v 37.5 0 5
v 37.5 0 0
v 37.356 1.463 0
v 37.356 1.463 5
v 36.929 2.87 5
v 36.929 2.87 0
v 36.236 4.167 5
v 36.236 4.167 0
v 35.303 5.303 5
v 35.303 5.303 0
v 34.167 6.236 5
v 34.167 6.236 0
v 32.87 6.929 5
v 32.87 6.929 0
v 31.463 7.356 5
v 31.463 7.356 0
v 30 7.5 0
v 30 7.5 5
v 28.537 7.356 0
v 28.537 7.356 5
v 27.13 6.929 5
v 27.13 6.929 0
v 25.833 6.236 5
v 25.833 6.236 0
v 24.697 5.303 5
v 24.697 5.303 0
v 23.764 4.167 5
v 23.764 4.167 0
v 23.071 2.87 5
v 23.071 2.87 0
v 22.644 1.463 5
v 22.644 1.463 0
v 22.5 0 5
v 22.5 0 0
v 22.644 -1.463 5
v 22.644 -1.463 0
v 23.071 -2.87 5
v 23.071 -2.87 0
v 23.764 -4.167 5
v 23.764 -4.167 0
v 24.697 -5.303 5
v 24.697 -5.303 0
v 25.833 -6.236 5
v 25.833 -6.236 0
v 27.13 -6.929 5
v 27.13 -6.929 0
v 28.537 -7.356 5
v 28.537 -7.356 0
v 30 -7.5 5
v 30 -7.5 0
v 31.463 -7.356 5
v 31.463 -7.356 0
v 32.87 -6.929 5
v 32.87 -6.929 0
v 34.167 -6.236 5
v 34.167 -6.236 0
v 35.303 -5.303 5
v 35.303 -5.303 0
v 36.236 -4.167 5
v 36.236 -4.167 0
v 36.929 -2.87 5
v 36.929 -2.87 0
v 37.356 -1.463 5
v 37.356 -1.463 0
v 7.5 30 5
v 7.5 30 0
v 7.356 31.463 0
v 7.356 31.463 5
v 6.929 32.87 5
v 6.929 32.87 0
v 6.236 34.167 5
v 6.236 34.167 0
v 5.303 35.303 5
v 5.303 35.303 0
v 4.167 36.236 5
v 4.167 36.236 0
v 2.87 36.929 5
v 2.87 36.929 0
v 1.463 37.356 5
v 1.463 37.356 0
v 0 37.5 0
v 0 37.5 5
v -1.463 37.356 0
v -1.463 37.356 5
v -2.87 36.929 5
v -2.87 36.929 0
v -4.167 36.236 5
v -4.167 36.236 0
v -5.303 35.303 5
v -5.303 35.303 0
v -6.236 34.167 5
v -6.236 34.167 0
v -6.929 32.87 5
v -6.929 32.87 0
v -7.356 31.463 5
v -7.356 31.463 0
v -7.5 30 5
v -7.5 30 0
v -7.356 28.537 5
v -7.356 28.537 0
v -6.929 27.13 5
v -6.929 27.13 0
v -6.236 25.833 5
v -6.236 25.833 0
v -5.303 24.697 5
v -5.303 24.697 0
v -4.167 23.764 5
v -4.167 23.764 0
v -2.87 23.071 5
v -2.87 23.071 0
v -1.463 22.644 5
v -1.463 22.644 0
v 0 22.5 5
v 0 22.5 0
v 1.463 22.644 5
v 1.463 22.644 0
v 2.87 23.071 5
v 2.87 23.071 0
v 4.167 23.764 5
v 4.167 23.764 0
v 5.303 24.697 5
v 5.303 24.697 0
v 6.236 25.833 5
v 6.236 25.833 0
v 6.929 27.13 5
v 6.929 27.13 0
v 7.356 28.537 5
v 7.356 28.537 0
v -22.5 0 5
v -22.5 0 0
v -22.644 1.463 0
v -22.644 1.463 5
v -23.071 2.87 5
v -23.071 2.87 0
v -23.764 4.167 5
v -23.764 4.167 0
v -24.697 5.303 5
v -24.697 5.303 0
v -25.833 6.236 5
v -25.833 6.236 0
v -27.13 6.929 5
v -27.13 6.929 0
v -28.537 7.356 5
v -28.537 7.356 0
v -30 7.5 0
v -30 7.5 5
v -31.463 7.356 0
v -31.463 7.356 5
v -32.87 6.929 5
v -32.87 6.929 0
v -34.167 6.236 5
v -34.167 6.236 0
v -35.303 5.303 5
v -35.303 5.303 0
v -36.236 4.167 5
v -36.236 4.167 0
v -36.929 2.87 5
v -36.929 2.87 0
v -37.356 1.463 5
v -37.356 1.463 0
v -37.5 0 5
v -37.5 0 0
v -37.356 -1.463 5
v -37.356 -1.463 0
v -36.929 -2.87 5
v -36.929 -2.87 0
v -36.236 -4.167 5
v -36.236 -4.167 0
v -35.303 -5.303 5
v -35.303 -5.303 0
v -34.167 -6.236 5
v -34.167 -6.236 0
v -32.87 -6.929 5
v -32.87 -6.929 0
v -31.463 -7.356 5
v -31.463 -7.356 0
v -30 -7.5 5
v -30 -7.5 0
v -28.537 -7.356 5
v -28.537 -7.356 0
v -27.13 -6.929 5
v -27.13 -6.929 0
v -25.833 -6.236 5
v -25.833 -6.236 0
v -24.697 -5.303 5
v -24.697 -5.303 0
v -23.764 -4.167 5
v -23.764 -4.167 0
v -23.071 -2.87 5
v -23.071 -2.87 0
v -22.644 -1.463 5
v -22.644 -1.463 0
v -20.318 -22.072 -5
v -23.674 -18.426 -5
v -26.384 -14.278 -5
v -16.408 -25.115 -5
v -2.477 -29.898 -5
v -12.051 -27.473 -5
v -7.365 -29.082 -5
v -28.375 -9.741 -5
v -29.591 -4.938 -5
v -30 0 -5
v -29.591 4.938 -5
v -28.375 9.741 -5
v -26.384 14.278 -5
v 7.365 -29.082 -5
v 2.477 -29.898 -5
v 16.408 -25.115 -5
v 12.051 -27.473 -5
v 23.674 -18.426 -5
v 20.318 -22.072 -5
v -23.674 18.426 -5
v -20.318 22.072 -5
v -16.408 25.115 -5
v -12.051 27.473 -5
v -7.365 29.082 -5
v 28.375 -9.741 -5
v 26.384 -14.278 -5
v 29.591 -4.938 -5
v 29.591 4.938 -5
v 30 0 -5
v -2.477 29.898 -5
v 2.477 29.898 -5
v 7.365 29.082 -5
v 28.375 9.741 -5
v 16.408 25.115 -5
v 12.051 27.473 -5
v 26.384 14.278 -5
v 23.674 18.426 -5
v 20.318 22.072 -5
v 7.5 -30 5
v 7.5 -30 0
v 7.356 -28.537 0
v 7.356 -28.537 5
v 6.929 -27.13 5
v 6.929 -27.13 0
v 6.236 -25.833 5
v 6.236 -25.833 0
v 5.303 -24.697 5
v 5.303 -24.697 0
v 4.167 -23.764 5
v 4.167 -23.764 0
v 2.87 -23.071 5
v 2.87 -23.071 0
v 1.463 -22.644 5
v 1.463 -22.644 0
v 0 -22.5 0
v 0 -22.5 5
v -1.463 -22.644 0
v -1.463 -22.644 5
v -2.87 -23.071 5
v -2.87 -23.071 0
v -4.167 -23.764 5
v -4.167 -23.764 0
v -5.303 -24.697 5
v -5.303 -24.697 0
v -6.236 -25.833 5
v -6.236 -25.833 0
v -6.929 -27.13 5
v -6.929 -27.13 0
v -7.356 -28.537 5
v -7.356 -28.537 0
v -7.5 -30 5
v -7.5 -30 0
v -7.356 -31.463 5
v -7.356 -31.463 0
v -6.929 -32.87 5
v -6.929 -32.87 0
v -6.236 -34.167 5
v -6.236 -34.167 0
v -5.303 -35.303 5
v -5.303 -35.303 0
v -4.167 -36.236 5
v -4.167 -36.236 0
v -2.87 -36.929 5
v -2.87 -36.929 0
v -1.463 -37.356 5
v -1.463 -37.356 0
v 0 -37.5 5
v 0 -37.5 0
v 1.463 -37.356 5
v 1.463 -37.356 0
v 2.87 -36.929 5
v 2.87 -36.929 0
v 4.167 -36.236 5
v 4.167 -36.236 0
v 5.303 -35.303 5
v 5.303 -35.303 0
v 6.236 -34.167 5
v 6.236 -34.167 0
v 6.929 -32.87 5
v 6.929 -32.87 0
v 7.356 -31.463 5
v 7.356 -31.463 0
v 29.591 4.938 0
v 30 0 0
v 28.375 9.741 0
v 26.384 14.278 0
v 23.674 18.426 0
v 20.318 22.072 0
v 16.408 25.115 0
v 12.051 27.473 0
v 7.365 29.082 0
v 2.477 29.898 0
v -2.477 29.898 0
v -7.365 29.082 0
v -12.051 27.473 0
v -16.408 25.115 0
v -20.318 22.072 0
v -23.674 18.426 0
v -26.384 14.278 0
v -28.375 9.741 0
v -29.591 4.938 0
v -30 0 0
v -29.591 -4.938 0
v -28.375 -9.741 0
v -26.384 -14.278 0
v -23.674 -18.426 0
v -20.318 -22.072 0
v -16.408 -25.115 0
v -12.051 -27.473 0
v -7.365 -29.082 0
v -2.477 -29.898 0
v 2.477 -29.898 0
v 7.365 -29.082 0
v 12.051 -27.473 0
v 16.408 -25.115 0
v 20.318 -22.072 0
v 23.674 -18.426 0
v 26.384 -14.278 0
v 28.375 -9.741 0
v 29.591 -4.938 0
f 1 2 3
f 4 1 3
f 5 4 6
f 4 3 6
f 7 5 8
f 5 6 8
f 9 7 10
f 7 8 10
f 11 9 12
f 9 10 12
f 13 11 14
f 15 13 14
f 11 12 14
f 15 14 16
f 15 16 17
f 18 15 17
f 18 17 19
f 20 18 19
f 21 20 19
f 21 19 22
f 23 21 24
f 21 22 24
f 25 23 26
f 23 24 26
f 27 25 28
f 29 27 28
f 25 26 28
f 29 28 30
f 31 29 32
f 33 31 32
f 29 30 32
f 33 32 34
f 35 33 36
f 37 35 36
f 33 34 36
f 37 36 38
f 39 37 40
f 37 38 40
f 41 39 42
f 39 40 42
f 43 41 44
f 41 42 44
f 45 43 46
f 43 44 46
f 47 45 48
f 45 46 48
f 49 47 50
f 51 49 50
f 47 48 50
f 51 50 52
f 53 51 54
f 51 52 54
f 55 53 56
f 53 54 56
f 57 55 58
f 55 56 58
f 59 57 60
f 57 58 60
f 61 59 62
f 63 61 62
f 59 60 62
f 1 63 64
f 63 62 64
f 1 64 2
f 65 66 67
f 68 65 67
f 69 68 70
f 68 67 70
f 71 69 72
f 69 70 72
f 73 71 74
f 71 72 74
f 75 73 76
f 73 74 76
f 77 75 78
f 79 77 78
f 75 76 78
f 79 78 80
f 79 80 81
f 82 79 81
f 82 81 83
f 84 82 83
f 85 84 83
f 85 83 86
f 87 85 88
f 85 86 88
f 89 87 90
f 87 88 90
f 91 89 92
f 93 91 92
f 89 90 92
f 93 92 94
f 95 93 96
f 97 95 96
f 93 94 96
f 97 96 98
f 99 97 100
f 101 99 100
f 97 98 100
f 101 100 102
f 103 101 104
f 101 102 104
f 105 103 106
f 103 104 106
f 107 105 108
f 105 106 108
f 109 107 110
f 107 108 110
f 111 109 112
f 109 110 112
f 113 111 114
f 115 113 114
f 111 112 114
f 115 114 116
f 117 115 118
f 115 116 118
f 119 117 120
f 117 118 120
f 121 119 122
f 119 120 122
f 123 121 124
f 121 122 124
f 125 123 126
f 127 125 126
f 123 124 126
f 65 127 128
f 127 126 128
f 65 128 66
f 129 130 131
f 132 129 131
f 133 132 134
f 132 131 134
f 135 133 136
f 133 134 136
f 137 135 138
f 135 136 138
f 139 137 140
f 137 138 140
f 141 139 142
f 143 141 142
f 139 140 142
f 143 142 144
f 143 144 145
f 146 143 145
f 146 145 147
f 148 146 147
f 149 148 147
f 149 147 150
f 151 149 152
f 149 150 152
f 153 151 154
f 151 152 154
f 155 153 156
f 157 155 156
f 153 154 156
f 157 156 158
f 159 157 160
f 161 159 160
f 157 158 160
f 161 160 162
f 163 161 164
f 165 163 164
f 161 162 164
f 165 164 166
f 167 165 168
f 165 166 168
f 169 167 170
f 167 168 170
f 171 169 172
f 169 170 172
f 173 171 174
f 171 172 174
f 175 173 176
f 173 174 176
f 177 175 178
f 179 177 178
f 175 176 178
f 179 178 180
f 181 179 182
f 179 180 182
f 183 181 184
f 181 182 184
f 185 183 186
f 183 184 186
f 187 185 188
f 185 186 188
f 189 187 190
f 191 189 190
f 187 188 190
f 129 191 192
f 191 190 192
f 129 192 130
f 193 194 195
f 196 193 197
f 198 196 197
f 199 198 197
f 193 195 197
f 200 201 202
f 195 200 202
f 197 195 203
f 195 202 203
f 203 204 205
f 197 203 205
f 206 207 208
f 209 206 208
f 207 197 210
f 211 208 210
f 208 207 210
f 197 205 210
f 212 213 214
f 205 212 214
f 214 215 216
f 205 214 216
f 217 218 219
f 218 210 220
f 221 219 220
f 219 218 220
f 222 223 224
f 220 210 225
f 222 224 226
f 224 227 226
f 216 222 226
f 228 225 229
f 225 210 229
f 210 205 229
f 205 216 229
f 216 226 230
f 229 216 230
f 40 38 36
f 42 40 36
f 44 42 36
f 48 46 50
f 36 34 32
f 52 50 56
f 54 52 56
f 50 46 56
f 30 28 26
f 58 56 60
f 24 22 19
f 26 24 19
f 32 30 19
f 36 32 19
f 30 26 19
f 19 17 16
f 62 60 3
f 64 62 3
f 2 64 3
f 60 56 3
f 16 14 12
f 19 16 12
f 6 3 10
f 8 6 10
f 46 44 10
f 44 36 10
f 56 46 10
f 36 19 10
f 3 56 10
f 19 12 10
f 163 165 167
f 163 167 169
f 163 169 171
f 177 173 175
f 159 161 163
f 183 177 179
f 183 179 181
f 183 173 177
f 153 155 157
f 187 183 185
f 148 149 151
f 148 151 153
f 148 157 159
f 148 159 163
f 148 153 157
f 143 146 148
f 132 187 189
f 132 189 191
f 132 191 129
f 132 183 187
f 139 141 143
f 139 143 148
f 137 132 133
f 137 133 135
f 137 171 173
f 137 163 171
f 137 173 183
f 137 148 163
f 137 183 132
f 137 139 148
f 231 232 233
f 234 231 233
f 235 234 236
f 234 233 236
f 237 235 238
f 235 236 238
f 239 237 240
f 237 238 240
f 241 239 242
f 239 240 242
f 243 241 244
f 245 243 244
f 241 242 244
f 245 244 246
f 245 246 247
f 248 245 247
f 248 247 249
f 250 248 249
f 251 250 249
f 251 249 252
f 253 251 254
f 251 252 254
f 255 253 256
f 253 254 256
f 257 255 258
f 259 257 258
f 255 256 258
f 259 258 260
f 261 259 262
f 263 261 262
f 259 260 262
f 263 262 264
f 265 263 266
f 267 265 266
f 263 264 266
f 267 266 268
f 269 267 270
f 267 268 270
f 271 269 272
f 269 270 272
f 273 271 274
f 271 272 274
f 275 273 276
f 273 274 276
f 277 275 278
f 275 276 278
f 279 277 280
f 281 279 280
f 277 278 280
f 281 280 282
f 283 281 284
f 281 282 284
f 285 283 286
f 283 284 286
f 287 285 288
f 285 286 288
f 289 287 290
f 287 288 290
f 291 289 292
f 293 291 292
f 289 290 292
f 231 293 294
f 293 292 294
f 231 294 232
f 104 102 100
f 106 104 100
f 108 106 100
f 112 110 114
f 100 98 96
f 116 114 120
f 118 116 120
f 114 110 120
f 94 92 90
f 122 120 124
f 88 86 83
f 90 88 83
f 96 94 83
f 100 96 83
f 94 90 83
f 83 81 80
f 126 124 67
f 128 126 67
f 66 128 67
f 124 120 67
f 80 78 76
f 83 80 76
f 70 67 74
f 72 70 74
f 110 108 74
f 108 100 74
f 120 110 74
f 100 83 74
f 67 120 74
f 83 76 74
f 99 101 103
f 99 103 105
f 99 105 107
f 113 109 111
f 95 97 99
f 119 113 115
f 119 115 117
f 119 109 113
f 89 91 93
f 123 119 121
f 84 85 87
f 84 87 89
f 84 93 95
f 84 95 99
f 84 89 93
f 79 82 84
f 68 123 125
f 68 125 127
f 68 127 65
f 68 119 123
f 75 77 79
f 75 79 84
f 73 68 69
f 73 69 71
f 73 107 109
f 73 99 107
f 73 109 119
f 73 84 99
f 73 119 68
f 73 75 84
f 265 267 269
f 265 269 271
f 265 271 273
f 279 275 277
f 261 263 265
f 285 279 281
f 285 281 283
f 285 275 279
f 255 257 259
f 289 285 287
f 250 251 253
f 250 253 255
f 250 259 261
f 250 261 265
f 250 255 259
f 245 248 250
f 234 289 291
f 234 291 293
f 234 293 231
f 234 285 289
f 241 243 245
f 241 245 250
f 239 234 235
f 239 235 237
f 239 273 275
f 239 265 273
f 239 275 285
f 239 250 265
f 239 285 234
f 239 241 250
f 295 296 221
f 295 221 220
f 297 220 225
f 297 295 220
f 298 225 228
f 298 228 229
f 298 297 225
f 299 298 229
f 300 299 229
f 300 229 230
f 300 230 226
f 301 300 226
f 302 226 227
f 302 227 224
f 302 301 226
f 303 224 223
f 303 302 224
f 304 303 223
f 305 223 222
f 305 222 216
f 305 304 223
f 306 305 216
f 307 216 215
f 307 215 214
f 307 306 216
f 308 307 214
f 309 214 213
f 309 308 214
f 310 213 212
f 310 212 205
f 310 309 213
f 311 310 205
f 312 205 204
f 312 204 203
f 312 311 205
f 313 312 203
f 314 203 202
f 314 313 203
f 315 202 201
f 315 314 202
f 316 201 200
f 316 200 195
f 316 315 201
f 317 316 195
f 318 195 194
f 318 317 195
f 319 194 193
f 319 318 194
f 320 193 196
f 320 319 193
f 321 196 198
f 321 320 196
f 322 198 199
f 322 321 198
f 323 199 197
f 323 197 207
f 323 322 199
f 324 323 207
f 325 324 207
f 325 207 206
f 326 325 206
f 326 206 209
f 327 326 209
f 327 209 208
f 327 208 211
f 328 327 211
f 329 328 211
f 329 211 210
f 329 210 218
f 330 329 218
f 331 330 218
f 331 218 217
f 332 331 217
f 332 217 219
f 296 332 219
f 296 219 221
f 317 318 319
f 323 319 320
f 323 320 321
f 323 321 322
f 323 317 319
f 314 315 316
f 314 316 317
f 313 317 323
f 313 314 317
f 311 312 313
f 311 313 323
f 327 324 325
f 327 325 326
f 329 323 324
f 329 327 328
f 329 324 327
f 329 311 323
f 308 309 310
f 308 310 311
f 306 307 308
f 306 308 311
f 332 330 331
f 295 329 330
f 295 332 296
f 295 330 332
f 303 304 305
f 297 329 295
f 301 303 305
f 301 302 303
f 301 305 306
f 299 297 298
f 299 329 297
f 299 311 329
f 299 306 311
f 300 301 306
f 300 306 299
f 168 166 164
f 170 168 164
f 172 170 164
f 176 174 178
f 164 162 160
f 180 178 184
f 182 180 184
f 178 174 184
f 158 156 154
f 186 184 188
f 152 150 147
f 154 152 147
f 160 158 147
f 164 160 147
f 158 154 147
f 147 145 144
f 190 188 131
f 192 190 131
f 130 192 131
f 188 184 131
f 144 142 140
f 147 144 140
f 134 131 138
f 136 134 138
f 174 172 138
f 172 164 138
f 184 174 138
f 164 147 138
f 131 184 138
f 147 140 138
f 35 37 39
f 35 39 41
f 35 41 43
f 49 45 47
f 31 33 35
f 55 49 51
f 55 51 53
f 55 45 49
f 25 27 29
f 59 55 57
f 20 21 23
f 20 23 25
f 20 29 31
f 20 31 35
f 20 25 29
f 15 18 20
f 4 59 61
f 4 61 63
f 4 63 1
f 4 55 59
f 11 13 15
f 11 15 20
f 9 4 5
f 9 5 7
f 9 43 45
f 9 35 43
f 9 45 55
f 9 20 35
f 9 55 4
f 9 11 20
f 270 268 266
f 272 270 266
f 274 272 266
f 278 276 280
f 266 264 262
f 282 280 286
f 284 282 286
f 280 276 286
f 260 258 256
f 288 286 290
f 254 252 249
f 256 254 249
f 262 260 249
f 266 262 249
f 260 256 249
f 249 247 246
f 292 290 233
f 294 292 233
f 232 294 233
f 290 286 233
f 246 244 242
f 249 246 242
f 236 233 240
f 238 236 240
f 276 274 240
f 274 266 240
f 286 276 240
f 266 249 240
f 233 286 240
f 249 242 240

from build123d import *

# Parameters (mm, degrees)
SKIZZE1_R                 = 30
LINEAR_AUSTRAGEN1_DEPTH   = 5
SKIZZE1_3_R               = 7.5
LINEAR_AUSTRAGEN2_DEPTH   = 5
LINEAR_AUSTRAGEN2_2_DEPTH = 5
LINEAR_AUSTRAGEN2_3_DEPTH = 5
LINEAR_AUSTRAGEN2_4_DEPTH = 5


with BuildPart() as part:
    # Skizze1 → Linear austragen1 (new body)
    with BuildSketch(Plane.XY):
        Circle(SKIZZE1_R)
    extrude(amount=-LINEAR_AUSTRAGEN1_DEPTH)


with BuildPart() as body_2:
    # Skizze1_3 → Linear austragen2 (new body)
    with BuildSketch(Plane.XY):
        with Locations((0, 30)):
            Circle(SKIZZE1_3_R)
    extrude(amount=LINEAR_AUSTRAGEN2_DEPTH)


with BuildPart() as body_3:
    # Skizze1_3 → Linear austragen2 2 (new body)
    with BuildSketch(Plane.XY):
        with Locations((30, 0)):
            Circle(SKIZZE1_3_R)
    extrude(amount=LINEAR_AUSTRAGEN2_2_DEPTH)


with BuildPart() as body_4:
    # Skizze1_3 → Linear austragen2 3 (new body)
    with BuildSketch(Plane.XY):
        with Locations((0, -30)):
            Circle(SKIZZE1_3_R)
    extrude(amount=LINEAR_AUSTRAGEN2_3_DEPTH)


with BuildPart() as body_5:
    # Skizze1_3 → Linear austragen2 4 (new body)
    with BuildSketch(Plane.XY):
        with Locations((-30, 0)):
            Circle(SKIZZE1_3_R)
    extrude(amount=LINEAR_AUSTRAGEN2_4_DEPTH)


solid = Compound([part.part, body_2.part, body_3.part, body_4.part, body_5.part])
